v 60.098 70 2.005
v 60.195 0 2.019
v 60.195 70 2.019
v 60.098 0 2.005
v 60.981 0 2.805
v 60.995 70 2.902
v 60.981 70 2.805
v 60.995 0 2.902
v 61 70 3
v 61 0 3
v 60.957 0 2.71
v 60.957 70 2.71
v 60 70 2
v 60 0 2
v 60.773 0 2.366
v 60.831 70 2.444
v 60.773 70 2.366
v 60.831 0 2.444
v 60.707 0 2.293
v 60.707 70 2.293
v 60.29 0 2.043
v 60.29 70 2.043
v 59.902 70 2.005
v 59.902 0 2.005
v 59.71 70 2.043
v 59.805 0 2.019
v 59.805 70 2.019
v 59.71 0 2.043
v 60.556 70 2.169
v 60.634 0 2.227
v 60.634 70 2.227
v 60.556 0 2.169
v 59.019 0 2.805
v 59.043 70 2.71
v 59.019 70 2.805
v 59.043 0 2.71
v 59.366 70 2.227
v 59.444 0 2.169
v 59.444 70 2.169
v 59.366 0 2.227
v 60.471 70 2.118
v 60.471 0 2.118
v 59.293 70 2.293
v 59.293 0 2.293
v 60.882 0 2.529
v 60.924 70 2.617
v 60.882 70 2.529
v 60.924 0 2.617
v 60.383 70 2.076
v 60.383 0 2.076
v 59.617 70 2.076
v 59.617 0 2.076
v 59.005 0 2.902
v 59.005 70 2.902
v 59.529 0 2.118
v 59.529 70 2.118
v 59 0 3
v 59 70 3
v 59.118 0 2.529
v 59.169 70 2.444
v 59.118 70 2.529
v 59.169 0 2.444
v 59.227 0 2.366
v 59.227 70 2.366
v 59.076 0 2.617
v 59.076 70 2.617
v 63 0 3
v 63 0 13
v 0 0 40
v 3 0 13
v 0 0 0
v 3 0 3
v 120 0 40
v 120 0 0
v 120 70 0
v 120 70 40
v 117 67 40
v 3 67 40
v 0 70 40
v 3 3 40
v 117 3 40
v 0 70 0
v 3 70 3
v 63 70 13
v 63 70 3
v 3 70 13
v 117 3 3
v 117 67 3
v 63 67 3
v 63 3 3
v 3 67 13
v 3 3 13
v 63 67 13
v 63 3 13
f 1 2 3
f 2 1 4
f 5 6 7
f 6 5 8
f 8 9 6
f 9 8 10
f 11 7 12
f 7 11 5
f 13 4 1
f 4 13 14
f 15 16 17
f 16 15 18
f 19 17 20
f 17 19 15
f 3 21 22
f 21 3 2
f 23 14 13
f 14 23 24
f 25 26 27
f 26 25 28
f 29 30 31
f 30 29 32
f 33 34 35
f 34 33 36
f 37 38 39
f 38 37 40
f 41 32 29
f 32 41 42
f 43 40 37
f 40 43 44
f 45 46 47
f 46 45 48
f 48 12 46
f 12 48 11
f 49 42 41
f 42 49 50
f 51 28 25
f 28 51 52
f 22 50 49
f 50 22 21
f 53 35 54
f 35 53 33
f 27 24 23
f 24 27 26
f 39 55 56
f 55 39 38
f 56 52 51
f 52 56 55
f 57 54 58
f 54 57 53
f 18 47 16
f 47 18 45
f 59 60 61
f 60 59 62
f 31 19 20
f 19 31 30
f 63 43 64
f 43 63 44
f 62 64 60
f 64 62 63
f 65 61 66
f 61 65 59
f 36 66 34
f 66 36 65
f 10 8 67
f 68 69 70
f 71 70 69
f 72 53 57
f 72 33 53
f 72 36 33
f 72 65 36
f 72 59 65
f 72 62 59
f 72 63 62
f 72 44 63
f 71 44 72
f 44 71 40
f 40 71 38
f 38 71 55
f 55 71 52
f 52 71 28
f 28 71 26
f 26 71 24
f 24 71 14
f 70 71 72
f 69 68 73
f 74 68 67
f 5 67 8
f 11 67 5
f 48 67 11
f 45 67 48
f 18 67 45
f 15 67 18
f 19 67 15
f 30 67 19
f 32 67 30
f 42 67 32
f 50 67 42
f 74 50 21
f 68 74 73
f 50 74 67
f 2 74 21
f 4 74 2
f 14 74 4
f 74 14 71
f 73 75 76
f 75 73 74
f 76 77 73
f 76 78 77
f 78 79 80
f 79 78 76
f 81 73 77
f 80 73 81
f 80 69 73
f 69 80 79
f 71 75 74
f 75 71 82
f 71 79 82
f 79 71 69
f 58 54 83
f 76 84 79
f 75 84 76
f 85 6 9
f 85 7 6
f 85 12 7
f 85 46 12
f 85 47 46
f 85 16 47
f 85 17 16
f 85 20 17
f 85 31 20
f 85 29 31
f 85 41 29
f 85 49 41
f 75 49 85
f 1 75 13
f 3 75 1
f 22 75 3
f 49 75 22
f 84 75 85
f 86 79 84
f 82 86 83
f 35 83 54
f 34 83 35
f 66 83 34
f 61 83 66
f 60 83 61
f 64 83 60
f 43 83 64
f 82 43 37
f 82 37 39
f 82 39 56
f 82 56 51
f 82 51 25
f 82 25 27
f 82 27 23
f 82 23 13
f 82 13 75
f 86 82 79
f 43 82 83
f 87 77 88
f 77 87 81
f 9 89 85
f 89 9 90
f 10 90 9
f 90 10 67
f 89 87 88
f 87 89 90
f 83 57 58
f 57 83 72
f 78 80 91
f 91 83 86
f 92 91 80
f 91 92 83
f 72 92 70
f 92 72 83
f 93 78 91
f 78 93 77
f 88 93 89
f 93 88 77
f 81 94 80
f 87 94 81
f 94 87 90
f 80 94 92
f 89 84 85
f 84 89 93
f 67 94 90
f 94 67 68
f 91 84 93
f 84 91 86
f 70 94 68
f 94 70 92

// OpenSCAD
// Buffer tank for a mini horizontal gel-electrophoresis box. Open-top rectangular tank with a
// solid raised platform for the gel tray in the middle, dividing the bottom into two buffer
// chambers. Each end wall gets a horizontal 2 mm hole along X at y = 0, z = 30 for the
// electrode wires. NOVEL general part.
//

tank_L = 120;
tank_W = 70;
tank_H = 40;
wall   = 3;
floor  = 3;
plat_L = 60;
plat_H = 10;

$fn = 64;

inner_L = tank_L - 2 * wall;
inner_W = tank_W - 2 * wall;
inner_H = tank_H - floor;

difference() {
    cube([tank_L, tank_W, tank_H]);
    translate([wall, wall, floor]) cube([inner_L, inner_W, inner_H]);     // hollow, open top
    translate([wall, 0, floor]) cube([plat_L, tank_W, plat_H]);           // raised platform (Y spans full width)
    for (x = [-tank_L / 2, tank_L / 2])
        translate([x, 0, tank_H - inner_H]) rotate([-90, 0, 0]) cylinder(h = tank_L, d = 2);  // horizontal hole through each end wall along X at y = 0, z = 30
}
